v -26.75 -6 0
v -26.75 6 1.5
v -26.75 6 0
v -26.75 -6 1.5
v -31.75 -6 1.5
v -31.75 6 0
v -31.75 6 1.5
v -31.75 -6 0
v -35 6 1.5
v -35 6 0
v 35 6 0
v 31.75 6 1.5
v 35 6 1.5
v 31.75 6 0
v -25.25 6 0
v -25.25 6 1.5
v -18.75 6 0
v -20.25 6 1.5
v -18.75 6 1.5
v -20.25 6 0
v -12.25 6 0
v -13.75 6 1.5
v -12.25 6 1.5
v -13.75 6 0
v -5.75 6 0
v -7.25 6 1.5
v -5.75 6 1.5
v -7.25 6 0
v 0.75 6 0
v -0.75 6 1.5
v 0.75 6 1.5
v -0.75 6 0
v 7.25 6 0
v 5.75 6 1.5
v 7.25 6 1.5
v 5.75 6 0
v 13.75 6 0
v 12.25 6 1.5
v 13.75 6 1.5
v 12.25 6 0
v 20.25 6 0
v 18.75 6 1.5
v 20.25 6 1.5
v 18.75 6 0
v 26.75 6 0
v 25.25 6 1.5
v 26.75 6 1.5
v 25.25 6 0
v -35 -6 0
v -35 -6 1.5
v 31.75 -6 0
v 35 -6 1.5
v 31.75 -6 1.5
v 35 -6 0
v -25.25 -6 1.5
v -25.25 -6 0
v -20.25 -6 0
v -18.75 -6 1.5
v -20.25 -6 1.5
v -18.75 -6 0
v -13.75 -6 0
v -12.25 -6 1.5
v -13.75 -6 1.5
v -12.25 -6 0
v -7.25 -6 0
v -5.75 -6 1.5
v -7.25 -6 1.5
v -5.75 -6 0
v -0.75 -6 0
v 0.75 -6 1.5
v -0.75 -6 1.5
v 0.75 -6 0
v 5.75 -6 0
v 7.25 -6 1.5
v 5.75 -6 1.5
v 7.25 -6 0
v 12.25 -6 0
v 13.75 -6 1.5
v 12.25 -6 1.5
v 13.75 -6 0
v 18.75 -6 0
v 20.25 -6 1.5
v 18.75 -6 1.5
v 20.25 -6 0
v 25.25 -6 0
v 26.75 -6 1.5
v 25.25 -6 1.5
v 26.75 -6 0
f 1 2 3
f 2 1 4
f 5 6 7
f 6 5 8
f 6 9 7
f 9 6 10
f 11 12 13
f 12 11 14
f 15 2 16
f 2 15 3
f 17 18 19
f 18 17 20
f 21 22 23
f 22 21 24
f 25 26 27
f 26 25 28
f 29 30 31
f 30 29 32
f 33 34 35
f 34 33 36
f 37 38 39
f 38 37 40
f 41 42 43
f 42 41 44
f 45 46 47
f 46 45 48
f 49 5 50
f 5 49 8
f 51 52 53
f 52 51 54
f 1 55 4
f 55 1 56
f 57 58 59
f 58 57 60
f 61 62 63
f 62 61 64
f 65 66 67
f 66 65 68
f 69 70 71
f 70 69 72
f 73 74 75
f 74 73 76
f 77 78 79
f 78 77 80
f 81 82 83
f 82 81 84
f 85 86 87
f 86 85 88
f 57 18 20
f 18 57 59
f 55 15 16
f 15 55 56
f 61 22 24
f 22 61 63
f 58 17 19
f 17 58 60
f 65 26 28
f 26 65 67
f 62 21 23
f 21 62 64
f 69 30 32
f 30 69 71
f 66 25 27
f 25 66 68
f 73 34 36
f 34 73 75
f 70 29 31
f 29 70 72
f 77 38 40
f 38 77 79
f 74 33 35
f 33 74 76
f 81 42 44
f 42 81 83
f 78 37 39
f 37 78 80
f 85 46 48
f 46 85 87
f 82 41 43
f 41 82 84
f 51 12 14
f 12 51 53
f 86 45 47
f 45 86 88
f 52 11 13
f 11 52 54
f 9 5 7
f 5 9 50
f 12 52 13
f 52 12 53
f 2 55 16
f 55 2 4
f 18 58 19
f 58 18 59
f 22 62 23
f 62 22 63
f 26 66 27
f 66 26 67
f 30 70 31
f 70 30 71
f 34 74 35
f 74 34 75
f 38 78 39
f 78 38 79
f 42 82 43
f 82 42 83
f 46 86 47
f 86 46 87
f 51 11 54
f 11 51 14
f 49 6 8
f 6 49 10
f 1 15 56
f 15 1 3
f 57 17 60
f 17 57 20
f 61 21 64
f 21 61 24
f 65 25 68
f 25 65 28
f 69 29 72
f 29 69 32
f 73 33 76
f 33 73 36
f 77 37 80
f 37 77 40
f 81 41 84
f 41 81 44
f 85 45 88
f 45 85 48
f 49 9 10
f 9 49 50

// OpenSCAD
// 10-well agarose gel comb, printed lying flat
// Units: mm

plate_t      = 1.5;    // plate thickness (Z)
spine_len    = 70;     // spine length (X)
spine_w      = 12;     // spine width (Y)
tooth_count  = 10;     // number of teeth
tooth_w      = 5.0;    // tooth width (X)
tooth_len    = 12;     // tooth length (Y)
gap          = 1.5;    // gap between teeth (X)
eps          = 0.5;    // cutter overshoot

pitch = tooth_w + gap; // centre-to-centre tooth spacing

difference() {
    // Base plate
    translate([-spine_len/2, -spine_w/2, 0])
        cube([spine_len, spine_w, plate_t]);

    // Teeth, centred on the plate
    for (i = [0 : tooth_count - 1])
        translate([(i - (tooth_count - 1)/2) * pitch - tooth_w/2, -tooth_len/2, -eps])
            cube([tooth_w, tooth_len, plate_t + 2*eps]);
}
